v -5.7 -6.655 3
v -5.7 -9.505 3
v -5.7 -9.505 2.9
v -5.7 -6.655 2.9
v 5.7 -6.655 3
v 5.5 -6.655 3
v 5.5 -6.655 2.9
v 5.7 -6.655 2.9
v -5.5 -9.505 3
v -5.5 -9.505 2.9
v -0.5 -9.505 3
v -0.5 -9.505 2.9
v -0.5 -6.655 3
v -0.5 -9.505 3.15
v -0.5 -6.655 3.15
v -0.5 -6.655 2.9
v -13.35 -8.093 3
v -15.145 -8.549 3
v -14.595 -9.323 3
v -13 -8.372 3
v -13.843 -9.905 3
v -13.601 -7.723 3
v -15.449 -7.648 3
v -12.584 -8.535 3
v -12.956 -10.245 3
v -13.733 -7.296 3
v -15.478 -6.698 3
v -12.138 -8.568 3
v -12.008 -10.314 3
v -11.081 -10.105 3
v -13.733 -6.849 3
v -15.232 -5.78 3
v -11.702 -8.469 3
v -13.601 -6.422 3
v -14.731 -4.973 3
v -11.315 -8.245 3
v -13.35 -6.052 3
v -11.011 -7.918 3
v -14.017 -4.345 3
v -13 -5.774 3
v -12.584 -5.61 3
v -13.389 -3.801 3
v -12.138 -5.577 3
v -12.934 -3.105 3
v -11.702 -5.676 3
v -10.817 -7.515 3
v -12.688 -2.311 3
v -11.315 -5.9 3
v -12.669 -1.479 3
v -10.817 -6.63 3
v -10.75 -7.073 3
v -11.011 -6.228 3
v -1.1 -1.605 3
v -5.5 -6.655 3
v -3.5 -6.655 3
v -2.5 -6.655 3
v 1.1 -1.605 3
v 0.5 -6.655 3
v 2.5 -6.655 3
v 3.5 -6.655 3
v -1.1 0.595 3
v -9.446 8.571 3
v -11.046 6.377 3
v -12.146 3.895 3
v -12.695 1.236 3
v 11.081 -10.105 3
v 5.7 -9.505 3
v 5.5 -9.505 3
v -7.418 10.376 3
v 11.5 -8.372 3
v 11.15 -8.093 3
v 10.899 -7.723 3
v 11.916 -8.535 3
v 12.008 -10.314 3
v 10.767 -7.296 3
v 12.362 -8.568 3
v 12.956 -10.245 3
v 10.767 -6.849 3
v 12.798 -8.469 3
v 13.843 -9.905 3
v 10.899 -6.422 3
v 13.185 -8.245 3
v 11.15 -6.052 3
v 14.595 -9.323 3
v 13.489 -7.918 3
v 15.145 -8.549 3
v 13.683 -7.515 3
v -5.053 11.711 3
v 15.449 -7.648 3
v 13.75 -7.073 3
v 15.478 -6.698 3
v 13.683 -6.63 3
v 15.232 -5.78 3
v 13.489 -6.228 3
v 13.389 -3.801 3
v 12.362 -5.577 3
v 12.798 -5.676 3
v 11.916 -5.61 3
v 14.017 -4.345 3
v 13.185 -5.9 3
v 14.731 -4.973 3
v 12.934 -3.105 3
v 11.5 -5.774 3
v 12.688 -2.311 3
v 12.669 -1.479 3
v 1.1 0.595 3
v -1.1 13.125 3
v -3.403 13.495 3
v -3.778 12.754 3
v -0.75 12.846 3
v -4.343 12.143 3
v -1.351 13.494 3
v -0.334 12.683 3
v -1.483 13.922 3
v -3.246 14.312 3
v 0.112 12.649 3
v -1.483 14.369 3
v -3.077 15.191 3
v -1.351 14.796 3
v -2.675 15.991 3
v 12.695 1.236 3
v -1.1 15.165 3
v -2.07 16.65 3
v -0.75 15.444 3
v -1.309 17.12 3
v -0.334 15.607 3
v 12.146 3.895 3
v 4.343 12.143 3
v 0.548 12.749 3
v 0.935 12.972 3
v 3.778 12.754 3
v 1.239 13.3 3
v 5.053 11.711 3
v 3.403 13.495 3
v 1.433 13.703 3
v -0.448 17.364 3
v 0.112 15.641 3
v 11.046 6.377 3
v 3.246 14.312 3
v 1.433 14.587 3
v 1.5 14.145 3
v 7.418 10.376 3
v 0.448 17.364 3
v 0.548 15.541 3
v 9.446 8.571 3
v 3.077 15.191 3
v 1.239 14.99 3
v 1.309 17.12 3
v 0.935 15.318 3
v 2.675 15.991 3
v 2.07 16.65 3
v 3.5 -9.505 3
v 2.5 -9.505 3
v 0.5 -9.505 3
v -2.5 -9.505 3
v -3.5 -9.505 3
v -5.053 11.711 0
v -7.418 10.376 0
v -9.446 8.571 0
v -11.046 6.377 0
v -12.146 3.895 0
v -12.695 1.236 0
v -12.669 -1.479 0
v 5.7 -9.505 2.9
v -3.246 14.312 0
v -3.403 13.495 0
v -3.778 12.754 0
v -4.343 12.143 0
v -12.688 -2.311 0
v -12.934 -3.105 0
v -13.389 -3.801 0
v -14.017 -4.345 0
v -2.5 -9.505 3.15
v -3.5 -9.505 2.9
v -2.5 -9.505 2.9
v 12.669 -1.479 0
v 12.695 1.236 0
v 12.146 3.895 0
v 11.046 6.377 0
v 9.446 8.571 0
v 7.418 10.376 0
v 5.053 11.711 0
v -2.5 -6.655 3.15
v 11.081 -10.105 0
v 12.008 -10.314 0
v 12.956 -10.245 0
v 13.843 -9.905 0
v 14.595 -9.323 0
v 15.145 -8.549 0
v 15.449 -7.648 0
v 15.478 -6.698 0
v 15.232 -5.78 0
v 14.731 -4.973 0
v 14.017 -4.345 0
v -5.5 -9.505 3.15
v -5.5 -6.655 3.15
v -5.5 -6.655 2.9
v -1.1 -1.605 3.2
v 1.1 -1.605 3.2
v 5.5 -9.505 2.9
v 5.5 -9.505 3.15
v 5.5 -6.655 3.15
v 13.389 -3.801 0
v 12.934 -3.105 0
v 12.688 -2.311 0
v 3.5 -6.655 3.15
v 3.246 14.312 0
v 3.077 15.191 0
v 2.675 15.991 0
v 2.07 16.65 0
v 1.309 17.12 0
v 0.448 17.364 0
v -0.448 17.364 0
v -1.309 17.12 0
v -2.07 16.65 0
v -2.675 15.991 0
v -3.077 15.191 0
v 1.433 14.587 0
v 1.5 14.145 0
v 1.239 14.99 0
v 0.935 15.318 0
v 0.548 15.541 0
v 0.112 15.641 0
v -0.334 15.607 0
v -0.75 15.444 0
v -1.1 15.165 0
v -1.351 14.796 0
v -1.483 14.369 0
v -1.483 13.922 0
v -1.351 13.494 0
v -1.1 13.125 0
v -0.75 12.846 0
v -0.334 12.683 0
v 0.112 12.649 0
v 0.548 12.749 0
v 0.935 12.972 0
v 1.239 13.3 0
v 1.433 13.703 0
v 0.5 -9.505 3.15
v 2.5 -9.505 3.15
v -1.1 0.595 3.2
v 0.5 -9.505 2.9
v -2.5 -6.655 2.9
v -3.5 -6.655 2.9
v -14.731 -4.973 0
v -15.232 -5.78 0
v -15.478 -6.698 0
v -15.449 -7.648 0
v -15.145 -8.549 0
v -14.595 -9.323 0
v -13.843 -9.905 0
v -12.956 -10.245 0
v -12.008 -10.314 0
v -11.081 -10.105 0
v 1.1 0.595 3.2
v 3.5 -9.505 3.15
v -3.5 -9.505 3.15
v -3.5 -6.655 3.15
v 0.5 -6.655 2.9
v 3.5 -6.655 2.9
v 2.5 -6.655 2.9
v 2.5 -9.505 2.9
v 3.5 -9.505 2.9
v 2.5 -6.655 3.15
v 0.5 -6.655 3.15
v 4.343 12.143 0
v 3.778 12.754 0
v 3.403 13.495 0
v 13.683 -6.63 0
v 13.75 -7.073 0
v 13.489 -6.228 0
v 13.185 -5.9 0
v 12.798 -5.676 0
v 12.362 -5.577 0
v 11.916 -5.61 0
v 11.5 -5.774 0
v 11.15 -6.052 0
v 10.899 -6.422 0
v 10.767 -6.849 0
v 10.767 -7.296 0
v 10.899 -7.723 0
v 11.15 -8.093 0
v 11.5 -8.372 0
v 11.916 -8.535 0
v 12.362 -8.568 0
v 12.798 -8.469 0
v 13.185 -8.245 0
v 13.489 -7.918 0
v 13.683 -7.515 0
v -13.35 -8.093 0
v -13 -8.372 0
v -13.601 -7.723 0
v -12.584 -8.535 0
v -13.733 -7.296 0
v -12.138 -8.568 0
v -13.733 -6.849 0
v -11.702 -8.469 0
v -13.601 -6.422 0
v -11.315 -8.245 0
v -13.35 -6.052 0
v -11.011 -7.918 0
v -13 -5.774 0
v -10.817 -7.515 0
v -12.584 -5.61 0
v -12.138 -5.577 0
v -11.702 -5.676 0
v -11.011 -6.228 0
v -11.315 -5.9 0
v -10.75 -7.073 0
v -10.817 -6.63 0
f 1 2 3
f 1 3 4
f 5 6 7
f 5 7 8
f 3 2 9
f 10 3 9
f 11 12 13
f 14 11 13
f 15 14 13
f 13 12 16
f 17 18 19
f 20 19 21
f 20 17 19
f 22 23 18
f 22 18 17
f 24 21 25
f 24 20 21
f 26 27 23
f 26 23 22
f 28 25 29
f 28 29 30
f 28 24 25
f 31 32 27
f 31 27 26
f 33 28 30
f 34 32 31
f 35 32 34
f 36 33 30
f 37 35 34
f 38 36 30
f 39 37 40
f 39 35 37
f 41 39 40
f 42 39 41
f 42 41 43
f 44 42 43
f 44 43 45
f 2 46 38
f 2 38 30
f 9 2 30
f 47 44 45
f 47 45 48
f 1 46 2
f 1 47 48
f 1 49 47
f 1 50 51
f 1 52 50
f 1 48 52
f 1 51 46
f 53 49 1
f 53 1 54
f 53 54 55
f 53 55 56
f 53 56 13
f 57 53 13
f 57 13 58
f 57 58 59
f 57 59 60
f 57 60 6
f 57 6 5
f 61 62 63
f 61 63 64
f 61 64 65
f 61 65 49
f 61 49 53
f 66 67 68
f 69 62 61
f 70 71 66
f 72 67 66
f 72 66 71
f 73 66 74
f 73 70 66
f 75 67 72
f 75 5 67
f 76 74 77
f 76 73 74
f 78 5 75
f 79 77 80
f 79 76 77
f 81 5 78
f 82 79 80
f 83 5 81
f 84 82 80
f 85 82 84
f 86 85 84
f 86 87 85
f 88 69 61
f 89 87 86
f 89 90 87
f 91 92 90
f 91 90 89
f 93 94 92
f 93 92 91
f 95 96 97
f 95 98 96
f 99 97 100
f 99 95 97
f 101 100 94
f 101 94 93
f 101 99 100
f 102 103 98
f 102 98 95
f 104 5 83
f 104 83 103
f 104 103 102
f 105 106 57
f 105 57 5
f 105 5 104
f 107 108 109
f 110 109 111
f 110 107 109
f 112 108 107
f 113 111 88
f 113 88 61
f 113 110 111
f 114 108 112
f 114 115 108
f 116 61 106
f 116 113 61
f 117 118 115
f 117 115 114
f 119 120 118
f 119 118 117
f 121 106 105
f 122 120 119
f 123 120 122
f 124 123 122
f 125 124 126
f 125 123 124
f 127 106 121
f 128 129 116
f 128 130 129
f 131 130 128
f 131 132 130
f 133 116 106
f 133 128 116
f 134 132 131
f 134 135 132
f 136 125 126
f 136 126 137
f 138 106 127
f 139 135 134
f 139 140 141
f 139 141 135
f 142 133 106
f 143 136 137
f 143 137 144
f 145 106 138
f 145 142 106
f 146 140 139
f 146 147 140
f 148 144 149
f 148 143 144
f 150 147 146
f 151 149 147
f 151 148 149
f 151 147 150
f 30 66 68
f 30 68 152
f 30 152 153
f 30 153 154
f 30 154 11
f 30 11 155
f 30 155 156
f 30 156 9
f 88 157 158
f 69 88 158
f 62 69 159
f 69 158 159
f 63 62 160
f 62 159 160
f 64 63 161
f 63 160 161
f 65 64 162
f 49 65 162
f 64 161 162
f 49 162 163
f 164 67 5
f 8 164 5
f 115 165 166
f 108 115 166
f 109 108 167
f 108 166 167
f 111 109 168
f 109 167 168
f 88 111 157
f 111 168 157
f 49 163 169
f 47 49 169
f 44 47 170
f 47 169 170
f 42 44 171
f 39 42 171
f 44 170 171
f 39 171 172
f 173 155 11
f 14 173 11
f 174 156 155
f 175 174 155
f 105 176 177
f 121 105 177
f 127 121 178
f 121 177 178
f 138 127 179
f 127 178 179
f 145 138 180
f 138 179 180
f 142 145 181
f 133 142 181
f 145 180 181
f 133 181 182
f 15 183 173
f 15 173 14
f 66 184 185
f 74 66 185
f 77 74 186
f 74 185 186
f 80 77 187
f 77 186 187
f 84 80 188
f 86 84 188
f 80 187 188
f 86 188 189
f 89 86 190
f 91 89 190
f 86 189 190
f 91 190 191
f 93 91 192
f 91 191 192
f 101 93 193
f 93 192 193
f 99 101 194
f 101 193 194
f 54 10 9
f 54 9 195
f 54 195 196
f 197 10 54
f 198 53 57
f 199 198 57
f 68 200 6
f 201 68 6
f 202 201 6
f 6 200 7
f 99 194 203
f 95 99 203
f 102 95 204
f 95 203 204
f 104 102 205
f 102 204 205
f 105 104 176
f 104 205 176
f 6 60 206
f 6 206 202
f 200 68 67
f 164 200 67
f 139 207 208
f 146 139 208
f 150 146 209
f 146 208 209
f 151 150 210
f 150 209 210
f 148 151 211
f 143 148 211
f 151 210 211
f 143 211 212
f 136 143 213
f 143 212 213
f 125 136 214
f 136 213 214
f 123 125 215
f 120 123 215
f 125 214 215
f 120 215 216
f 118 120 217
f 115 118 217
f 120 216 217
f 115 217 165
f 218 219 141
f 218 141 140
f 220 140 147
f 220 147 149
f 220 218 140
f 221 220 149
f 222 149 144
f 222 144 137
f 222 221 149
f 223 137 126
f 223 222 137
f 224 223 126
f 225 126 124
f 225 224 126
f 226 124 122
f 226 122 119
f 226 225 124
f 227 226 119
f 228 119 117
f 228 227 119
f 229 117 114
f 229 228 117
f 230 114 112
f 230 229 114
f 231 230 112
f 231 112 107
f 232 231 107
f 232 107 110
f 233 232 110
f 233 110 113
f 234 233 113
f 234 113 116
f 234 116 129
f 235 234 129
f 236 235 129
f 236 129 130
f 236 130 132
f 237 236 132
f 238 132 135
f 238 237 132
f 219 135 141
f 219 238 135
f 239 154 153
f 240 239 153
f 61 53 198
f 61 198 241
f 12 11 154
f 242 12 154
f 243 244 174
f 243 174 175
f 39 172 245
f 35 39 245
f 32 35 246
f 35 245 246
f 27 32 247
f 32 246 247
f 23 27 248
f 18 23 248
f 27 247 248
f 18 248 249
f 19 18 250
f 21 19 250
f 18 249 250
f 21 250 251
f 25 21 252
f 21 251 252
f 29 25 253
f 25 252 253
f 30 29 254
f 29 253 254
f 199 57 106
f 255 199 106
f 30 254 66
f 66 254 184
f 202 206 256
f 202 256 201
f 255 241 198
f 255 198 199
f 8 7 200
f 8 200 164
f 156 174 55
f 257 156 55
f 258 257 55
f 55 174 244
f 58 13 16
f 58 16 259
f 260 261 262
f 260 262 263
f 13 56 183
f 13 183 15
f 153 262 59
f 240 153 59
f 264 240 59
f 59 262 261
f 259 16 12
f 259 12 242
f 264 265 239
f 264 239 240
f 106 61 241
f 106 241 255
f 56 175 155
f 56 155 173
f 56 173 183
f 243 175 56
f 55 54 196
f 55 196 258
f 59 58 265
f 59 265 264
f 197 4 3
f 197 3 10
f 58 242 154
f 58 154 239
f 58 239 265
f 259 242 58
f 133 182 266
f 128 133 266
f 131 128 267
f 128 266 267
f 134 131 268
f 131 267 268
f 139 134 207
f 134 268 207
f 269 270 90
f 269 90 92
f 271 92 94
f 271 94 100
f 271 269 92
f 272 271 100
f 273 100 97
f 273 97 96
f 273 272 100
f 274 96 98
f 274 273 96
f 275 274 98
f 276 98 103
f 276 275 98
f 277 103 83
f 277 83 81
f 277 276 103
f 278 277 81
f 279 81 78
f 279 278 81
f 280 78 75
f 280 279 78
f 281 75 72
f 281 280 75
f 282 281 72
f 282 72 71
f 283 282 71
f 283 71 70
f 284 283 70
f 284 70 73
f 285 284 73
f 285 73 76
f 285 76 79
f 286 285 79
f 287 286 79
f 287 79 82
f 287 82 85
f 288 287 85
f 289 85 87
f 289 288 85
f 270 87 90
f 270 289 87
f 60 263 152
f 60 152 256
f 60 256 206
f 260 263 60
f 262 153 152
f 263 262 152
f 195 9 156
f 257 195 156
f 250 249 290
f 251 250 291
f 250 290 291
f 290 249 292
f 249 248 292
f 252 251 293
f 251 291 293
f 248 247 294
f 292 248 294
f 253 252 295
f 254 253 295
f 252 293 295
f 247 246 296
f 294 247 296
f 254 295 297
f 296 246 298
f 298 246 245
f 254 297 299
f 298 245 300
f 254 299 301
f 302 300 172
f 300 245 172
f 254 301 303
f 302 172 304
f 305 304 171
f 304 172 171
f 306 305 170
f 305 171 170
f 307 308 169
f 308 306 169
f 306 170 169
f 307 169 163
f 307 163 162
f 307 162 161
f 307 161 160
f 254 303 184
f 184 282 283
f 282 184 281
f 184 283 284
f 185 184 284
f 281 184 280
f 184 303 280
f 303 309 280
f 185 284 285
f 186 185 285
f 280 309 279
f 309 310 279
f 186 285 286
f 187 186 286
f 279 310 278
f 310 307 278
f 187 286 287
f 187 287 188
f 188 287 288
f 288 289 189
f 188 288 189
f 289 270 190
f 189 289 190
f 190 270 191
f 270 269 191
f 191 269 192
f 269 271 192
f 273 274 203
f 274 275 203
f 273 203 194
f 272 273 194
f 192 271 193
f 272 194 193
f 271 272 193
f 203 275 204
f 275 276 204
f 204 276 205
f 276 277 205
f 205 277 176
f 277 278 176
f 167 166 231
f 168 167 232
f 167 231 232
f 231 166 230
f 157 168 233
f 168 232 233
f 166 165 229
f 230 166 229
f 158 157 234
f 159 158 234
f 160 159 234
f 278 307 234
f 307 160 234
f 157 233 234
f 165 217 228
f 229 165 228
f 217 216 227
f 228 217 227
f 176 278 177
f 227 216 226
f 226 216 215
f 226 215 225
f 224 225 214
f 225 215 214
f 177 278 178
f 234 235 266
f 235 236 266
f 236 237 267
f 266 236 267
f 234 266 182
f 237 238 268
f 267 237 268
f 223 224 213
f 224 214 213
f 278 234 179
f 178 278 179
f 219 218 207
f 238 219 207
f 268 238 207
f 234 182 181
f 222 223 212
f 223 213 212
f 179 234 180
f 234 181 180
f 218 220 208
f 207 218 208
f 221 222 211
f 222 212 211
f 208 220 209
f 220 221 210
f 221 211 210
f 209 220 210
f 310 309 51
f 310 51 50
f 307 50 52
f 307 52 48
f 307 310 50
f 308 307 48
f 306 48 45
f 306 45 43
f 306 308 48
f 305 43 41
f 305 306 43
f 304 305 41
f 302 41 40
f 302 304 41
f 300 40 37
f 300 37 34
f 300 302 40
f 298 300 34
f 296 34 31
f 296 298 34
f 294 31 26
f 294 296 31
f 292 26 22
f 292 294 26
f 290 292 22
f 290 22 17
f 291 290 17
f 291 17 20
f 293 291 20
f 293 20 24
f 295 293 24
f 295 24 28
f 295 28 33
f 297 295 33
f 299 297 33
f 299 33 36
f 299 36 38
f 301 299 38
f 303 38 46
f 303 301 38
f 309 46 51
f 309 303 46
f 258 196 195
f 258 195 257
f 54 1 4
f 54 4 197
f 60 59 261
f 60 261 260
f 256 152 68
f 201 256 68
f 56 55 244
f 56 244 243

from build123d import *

# Parameters (mm, degrees)
F0_R     = 1.5
F1_DEPTH = 3
F2_W     = 2.2
F2_H     = 2.2
F3_DEPTH = 0.2
F4_W     = 11.4
F4_H     = 2.85
F5_DEPTH = 0.1
F6_W     = 2
F6_H     = 2.85
F7_DEPTH = 0.25


with BuildPart() as f1:
    # F0 (on Top) → F1 (new body)
    with BuildSketch(Plane.XY):
        with BuildLine():
            ThreePointArc((5.053231, 11.711225), (3.778342, 12.753574), (3.24572, 14.311827))
            ThreePointArc((3.24572, 14.311827), (0, 17.395082), (-3.24572, 14.311827))
            ThreePointArc((-3.24572, 14.311827), (-3.778342, 12.753574), (-5.053231, 11.711225))
            ThreePointArc((-5.053231, 11.711225), (-11.046083, 6.377459), (-12.668834, -1.479386))
            ThreePointArc((-12.668834, -1.479386), (-12.93409, -3.104647), (-14.017265, -4.345038))
            ThreePointArc((-14.017265, -4.345038), (-15.14542, -8.548699), (-11.080733, -10.104918))
            Line((-11.080733, -10.104918), (-6.711389, -10.104918))
            Line((-6.711389, -10.104918), (7.566323, -10.104918))
            Line((7.566323, -10.104918), (11.080733, -10.104918))
            ThreePointArc((11.080733, -10.104918), (15.14542, -8.548699), (14.017265, -4.345038))
            ThreePointArc((14.017265, -4.345038), (12.93409, -3.104647), (12.668834, -1.479386))
            ThreePointArc((12.668834, -1.479386), (11.046083, 6.377459), (5.053231, 11.711225))
        make_face()
        with Locations((-12.25, -7.072541)):
            Circle(F0_R, mode=Mode.SUBTRACT)
        with Locations((12.25, -7.072541)):
            Circle(F0_R, mode=Mode.SUBTRACT)
        with Locations((0, 14.145082)):
            Circle(F0_R, mode=Mode.SUBTRACT)
    extrude(amount=F1_DEPTH)

    # F2 (on face) → F3 (join)
    with BuildSketch(Plane.XY.offset(3)):
        with Locations((0, -0.504918)):
            Rectangle(F2_W, F2_H)
    extrude(amount=F3_DEPTH)

    # F4 (on face) → F5 (cut)
    with BuildSketch(Plane.XY.offset(3)):
        with Locations((0, -8.079918)):
            Rectangle(F4_W, F4_H)
    extrude(amount=-F5_DEPTH, mode=Mode.SUBTRACT)

    # F6 (on face) → F7 (join)
    with BuildSketch(Plane.XY.offset(2.9)):
        with Locations((-1.5, -8.079918)):
            Rectangle(F6_W, F6_H)
        with Locations((-4.5, -8.079918)):
            Rectangle(F6_W, F6_H)
        with Locations((1.5, -8.079918)):
            Rectangle(F6_W, F6_H)
        with Locations((4.5, -8.079918)):
            Rectangle(F6_W, F6_H)
    extrude(amount=F7_DEPTH)


solid = f1.part
